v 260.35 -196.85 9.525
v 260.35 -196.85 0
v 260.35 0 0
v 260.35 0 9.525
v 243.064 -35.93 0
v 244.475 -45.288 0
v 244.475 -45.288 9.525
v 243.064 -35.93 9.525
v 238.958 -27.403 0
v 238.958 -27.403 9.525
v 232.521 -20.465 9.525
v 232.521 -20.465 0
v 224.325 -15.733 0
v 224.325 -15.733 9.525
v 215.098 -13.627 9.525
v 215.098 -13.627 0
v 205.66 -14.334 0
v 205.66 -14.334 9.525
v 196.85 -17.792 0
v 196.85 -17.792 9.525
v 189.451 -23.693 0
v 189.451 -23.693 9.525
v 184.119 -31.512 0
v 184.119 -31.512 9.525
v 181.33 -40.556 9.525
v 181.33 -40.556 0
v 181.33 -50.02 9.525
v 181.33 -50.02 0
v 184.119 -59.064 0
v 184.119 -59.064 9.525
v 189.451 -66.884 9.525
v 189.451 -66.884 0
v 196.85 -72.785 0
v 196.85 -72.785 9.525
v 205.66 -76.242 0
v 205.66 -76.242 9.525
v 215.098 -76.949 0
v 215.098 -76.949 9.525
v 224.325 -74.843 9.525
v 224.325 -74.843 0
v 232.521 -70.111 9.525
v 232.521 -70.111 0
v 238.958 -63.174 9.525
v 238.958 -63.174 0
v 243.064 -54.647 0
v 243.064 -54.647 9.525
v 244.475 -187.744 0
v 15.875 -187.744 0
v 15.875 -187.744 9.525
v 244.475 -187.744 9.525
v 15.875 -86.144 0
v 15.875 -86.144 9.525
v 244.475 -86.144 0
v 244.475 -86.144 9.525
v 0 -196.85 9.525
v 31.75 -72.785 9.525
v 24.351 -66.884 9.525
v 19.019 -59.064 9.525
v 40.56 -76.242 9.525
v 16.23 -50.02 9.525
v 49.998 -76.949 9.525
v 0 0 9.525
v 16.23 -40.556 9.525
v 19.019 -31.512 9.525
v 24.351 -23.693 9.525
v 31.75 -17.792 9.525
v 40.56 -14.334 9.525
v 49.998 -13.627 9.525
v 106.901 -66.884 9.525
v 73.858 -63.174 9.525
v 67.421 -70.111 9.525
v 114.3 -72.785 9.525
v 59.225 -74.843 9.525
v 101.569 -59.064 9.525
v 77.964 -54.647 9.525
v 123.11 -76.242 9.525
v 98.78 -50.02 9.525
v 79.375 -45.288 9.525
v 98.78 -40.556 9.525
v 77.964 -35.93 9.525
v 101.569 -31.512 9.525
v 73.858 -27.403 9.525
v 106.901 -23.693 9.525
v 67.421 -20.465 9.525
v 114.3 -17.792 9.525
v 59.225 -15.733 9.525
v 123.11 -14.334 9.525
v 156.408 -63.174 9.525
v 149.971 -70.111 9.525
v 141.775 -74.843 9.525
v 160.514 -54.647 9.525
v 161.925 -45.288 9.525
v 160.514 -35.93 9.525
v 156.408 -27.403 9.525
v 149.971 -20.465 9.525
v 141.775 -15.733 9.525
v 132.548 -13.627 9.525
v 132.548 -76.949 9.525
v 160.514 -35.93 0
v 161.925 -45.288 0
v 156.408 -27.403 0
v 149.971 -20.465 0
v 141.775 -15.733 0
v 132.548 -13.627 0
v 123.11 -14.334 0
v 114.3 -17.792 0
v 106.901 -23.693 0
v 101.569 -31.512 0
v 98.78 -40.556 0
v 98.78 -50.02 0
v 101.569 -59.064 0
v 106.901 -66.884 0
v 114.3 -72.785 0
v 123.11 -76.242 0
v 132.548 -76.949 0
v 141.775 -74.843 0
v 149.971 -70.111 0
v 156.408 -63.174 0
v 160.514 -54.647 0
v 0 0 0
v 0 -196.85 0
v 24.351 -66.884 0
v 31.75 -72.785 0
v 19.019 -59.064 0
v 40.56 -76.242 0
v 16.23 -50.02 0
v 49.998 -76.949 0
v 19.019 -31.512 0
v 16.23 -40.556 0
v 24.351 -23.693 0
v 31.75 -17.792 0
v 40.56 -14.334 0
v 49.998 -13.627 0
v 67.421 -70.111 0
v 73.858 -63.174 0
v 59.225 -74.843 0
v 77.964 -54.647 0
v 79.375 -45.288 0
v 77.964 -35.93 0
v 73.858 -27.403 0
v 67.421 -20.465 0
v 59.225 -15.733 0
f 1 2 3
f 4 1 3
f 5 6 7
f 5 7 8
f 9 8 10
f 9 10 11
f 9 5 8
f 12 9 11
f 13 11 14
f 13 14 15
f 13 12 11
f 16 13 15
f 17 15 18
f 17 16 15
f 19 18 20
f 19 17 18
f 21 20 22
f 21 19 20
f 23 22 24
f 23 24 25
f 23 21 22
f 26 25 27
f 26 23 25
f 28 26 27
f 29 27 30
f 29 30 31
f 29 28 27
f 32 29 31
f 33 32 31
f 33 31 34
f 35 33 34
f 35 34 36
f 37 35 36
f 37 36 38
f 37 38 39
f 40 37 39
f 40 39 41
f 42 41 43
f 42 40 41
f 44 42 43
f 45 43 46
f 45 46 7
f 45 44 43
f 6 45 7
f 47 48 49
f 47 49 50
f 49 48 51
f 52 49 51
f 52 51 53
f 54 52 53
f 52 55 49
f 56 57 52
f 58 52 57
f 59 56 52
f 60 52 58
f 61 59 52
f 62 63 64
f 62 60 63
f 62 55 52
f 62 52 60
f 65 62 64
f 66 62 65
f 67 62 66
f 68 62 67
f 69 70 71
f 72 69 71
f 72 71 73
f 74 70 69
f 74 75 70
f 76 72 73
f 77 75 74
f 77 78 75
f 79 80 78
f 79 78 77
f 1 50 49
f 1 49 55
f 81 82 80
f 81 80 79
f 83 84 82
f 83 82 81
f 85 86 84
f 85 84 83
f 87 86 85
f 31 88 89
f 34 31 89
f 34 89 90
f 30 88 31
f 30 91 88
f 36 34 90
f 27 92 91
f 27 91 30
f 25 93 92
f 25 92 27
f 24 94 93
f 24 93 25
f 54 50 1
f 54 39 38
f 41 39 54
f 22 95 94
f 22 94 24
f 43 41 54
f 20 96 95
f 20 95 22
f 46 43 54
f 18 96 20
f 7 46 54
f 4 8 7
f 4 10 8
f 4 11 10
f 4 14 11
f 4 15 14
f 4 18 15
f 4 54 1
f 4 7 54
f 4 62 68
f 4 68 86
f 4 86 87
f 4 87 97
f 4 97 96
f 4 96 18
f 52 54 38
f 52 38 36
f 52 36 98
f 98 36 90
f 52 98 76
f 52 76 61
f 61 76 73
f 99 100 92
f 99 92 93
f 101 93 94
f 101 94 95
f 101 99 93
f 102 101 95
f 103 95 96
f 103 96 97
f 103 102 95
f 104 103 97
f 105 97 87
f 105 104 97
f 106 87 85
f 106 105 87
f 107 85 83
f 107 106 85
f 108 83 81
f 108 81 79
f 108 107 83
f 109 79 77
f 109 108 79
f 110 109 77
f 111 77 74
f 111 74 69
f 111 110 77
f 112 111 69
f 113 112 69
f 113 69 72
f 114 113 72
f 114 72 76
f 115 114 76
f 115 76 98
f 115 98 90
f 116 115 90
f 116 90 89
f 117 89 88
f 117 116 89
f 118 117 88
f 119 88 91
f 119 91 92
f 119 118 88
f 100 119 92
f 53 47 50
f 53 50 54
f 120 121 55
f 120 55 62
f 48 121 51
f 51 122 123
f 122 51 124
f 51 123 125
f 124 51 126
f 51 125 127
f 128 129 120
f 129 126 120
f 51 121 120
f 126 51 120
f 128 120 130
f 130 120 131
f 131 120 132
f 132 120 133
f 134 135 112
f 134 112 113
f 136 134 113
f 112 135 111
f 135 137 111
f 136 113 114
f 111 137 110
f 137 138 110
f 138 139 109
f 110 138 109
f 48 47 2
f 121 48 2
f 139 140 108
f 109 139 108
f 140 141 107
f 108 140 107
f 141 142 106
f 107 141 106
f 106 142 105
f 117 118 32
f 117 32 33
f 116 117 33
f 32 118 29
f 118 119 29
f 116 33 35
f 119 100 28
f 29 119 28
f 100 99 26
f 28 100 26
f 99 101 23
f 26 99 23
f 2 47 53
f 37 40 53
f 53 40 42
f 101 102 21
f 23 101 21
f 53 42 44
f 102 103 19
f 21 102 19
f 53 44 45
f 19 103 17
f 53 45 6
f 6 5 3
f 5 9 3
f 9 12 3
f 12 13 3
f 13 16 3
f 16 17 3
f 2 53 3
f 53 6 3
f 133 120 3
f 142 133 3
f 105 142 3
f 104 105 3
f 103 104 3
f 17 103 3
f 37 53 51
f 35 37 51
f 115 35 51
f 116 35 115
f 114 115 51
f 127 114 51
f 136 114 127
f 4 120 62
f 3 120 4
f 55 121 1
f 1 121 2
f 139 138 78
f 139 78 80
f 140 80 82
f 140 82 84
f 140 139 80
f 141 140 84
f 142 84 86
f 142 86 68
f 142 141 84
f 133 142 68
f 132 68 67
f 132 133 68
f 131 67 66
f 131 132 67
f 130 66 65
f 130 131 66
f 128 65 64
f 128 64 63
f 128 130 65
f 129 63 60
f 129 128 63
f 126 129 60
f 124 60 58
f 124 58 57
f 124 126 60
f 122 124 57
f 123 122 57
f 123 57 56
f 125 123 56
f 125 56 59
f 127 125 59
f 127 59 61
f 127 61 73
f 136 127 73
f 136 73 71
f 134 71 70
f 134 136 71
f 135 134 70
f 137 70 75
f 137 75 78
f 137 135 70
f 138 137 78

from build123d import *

# Parameters (mm, degrees)
F0_W     = 260.35
F0_H     = 196.85
F0_W_2   = 228.6
F0_H_2   = 101.6
F0_R     = 31.75
F1_DEPTH = 9.525


with BuildPart() as f1:
    # F0 (on Top) → F1 (new body)
    with BuildSketch(Plane.XY):
        with Locations((130.175, -98.425)):
            Rectangle(F0_W, F0_H)
        with Locations((130.175, -136.9441)):
            Rectangle(F0_W_2, F0_H_2, mode=Mode.SUBTRACT)
        with Locations((47.625, -45.2882)):
            Circle(F0_R, mode=Mode.SUBTRACT)
        with Locations((130.175, -45.2882)):
            Circle(F0_R, mode=Mode.SUBTRACT)
        with Locations((212.725, -45.2882)):
            Circle(F0_R, mode=Mode.SUBTRACT)
    extrude(amount=F1_DEPTH)


solid = f1.part
